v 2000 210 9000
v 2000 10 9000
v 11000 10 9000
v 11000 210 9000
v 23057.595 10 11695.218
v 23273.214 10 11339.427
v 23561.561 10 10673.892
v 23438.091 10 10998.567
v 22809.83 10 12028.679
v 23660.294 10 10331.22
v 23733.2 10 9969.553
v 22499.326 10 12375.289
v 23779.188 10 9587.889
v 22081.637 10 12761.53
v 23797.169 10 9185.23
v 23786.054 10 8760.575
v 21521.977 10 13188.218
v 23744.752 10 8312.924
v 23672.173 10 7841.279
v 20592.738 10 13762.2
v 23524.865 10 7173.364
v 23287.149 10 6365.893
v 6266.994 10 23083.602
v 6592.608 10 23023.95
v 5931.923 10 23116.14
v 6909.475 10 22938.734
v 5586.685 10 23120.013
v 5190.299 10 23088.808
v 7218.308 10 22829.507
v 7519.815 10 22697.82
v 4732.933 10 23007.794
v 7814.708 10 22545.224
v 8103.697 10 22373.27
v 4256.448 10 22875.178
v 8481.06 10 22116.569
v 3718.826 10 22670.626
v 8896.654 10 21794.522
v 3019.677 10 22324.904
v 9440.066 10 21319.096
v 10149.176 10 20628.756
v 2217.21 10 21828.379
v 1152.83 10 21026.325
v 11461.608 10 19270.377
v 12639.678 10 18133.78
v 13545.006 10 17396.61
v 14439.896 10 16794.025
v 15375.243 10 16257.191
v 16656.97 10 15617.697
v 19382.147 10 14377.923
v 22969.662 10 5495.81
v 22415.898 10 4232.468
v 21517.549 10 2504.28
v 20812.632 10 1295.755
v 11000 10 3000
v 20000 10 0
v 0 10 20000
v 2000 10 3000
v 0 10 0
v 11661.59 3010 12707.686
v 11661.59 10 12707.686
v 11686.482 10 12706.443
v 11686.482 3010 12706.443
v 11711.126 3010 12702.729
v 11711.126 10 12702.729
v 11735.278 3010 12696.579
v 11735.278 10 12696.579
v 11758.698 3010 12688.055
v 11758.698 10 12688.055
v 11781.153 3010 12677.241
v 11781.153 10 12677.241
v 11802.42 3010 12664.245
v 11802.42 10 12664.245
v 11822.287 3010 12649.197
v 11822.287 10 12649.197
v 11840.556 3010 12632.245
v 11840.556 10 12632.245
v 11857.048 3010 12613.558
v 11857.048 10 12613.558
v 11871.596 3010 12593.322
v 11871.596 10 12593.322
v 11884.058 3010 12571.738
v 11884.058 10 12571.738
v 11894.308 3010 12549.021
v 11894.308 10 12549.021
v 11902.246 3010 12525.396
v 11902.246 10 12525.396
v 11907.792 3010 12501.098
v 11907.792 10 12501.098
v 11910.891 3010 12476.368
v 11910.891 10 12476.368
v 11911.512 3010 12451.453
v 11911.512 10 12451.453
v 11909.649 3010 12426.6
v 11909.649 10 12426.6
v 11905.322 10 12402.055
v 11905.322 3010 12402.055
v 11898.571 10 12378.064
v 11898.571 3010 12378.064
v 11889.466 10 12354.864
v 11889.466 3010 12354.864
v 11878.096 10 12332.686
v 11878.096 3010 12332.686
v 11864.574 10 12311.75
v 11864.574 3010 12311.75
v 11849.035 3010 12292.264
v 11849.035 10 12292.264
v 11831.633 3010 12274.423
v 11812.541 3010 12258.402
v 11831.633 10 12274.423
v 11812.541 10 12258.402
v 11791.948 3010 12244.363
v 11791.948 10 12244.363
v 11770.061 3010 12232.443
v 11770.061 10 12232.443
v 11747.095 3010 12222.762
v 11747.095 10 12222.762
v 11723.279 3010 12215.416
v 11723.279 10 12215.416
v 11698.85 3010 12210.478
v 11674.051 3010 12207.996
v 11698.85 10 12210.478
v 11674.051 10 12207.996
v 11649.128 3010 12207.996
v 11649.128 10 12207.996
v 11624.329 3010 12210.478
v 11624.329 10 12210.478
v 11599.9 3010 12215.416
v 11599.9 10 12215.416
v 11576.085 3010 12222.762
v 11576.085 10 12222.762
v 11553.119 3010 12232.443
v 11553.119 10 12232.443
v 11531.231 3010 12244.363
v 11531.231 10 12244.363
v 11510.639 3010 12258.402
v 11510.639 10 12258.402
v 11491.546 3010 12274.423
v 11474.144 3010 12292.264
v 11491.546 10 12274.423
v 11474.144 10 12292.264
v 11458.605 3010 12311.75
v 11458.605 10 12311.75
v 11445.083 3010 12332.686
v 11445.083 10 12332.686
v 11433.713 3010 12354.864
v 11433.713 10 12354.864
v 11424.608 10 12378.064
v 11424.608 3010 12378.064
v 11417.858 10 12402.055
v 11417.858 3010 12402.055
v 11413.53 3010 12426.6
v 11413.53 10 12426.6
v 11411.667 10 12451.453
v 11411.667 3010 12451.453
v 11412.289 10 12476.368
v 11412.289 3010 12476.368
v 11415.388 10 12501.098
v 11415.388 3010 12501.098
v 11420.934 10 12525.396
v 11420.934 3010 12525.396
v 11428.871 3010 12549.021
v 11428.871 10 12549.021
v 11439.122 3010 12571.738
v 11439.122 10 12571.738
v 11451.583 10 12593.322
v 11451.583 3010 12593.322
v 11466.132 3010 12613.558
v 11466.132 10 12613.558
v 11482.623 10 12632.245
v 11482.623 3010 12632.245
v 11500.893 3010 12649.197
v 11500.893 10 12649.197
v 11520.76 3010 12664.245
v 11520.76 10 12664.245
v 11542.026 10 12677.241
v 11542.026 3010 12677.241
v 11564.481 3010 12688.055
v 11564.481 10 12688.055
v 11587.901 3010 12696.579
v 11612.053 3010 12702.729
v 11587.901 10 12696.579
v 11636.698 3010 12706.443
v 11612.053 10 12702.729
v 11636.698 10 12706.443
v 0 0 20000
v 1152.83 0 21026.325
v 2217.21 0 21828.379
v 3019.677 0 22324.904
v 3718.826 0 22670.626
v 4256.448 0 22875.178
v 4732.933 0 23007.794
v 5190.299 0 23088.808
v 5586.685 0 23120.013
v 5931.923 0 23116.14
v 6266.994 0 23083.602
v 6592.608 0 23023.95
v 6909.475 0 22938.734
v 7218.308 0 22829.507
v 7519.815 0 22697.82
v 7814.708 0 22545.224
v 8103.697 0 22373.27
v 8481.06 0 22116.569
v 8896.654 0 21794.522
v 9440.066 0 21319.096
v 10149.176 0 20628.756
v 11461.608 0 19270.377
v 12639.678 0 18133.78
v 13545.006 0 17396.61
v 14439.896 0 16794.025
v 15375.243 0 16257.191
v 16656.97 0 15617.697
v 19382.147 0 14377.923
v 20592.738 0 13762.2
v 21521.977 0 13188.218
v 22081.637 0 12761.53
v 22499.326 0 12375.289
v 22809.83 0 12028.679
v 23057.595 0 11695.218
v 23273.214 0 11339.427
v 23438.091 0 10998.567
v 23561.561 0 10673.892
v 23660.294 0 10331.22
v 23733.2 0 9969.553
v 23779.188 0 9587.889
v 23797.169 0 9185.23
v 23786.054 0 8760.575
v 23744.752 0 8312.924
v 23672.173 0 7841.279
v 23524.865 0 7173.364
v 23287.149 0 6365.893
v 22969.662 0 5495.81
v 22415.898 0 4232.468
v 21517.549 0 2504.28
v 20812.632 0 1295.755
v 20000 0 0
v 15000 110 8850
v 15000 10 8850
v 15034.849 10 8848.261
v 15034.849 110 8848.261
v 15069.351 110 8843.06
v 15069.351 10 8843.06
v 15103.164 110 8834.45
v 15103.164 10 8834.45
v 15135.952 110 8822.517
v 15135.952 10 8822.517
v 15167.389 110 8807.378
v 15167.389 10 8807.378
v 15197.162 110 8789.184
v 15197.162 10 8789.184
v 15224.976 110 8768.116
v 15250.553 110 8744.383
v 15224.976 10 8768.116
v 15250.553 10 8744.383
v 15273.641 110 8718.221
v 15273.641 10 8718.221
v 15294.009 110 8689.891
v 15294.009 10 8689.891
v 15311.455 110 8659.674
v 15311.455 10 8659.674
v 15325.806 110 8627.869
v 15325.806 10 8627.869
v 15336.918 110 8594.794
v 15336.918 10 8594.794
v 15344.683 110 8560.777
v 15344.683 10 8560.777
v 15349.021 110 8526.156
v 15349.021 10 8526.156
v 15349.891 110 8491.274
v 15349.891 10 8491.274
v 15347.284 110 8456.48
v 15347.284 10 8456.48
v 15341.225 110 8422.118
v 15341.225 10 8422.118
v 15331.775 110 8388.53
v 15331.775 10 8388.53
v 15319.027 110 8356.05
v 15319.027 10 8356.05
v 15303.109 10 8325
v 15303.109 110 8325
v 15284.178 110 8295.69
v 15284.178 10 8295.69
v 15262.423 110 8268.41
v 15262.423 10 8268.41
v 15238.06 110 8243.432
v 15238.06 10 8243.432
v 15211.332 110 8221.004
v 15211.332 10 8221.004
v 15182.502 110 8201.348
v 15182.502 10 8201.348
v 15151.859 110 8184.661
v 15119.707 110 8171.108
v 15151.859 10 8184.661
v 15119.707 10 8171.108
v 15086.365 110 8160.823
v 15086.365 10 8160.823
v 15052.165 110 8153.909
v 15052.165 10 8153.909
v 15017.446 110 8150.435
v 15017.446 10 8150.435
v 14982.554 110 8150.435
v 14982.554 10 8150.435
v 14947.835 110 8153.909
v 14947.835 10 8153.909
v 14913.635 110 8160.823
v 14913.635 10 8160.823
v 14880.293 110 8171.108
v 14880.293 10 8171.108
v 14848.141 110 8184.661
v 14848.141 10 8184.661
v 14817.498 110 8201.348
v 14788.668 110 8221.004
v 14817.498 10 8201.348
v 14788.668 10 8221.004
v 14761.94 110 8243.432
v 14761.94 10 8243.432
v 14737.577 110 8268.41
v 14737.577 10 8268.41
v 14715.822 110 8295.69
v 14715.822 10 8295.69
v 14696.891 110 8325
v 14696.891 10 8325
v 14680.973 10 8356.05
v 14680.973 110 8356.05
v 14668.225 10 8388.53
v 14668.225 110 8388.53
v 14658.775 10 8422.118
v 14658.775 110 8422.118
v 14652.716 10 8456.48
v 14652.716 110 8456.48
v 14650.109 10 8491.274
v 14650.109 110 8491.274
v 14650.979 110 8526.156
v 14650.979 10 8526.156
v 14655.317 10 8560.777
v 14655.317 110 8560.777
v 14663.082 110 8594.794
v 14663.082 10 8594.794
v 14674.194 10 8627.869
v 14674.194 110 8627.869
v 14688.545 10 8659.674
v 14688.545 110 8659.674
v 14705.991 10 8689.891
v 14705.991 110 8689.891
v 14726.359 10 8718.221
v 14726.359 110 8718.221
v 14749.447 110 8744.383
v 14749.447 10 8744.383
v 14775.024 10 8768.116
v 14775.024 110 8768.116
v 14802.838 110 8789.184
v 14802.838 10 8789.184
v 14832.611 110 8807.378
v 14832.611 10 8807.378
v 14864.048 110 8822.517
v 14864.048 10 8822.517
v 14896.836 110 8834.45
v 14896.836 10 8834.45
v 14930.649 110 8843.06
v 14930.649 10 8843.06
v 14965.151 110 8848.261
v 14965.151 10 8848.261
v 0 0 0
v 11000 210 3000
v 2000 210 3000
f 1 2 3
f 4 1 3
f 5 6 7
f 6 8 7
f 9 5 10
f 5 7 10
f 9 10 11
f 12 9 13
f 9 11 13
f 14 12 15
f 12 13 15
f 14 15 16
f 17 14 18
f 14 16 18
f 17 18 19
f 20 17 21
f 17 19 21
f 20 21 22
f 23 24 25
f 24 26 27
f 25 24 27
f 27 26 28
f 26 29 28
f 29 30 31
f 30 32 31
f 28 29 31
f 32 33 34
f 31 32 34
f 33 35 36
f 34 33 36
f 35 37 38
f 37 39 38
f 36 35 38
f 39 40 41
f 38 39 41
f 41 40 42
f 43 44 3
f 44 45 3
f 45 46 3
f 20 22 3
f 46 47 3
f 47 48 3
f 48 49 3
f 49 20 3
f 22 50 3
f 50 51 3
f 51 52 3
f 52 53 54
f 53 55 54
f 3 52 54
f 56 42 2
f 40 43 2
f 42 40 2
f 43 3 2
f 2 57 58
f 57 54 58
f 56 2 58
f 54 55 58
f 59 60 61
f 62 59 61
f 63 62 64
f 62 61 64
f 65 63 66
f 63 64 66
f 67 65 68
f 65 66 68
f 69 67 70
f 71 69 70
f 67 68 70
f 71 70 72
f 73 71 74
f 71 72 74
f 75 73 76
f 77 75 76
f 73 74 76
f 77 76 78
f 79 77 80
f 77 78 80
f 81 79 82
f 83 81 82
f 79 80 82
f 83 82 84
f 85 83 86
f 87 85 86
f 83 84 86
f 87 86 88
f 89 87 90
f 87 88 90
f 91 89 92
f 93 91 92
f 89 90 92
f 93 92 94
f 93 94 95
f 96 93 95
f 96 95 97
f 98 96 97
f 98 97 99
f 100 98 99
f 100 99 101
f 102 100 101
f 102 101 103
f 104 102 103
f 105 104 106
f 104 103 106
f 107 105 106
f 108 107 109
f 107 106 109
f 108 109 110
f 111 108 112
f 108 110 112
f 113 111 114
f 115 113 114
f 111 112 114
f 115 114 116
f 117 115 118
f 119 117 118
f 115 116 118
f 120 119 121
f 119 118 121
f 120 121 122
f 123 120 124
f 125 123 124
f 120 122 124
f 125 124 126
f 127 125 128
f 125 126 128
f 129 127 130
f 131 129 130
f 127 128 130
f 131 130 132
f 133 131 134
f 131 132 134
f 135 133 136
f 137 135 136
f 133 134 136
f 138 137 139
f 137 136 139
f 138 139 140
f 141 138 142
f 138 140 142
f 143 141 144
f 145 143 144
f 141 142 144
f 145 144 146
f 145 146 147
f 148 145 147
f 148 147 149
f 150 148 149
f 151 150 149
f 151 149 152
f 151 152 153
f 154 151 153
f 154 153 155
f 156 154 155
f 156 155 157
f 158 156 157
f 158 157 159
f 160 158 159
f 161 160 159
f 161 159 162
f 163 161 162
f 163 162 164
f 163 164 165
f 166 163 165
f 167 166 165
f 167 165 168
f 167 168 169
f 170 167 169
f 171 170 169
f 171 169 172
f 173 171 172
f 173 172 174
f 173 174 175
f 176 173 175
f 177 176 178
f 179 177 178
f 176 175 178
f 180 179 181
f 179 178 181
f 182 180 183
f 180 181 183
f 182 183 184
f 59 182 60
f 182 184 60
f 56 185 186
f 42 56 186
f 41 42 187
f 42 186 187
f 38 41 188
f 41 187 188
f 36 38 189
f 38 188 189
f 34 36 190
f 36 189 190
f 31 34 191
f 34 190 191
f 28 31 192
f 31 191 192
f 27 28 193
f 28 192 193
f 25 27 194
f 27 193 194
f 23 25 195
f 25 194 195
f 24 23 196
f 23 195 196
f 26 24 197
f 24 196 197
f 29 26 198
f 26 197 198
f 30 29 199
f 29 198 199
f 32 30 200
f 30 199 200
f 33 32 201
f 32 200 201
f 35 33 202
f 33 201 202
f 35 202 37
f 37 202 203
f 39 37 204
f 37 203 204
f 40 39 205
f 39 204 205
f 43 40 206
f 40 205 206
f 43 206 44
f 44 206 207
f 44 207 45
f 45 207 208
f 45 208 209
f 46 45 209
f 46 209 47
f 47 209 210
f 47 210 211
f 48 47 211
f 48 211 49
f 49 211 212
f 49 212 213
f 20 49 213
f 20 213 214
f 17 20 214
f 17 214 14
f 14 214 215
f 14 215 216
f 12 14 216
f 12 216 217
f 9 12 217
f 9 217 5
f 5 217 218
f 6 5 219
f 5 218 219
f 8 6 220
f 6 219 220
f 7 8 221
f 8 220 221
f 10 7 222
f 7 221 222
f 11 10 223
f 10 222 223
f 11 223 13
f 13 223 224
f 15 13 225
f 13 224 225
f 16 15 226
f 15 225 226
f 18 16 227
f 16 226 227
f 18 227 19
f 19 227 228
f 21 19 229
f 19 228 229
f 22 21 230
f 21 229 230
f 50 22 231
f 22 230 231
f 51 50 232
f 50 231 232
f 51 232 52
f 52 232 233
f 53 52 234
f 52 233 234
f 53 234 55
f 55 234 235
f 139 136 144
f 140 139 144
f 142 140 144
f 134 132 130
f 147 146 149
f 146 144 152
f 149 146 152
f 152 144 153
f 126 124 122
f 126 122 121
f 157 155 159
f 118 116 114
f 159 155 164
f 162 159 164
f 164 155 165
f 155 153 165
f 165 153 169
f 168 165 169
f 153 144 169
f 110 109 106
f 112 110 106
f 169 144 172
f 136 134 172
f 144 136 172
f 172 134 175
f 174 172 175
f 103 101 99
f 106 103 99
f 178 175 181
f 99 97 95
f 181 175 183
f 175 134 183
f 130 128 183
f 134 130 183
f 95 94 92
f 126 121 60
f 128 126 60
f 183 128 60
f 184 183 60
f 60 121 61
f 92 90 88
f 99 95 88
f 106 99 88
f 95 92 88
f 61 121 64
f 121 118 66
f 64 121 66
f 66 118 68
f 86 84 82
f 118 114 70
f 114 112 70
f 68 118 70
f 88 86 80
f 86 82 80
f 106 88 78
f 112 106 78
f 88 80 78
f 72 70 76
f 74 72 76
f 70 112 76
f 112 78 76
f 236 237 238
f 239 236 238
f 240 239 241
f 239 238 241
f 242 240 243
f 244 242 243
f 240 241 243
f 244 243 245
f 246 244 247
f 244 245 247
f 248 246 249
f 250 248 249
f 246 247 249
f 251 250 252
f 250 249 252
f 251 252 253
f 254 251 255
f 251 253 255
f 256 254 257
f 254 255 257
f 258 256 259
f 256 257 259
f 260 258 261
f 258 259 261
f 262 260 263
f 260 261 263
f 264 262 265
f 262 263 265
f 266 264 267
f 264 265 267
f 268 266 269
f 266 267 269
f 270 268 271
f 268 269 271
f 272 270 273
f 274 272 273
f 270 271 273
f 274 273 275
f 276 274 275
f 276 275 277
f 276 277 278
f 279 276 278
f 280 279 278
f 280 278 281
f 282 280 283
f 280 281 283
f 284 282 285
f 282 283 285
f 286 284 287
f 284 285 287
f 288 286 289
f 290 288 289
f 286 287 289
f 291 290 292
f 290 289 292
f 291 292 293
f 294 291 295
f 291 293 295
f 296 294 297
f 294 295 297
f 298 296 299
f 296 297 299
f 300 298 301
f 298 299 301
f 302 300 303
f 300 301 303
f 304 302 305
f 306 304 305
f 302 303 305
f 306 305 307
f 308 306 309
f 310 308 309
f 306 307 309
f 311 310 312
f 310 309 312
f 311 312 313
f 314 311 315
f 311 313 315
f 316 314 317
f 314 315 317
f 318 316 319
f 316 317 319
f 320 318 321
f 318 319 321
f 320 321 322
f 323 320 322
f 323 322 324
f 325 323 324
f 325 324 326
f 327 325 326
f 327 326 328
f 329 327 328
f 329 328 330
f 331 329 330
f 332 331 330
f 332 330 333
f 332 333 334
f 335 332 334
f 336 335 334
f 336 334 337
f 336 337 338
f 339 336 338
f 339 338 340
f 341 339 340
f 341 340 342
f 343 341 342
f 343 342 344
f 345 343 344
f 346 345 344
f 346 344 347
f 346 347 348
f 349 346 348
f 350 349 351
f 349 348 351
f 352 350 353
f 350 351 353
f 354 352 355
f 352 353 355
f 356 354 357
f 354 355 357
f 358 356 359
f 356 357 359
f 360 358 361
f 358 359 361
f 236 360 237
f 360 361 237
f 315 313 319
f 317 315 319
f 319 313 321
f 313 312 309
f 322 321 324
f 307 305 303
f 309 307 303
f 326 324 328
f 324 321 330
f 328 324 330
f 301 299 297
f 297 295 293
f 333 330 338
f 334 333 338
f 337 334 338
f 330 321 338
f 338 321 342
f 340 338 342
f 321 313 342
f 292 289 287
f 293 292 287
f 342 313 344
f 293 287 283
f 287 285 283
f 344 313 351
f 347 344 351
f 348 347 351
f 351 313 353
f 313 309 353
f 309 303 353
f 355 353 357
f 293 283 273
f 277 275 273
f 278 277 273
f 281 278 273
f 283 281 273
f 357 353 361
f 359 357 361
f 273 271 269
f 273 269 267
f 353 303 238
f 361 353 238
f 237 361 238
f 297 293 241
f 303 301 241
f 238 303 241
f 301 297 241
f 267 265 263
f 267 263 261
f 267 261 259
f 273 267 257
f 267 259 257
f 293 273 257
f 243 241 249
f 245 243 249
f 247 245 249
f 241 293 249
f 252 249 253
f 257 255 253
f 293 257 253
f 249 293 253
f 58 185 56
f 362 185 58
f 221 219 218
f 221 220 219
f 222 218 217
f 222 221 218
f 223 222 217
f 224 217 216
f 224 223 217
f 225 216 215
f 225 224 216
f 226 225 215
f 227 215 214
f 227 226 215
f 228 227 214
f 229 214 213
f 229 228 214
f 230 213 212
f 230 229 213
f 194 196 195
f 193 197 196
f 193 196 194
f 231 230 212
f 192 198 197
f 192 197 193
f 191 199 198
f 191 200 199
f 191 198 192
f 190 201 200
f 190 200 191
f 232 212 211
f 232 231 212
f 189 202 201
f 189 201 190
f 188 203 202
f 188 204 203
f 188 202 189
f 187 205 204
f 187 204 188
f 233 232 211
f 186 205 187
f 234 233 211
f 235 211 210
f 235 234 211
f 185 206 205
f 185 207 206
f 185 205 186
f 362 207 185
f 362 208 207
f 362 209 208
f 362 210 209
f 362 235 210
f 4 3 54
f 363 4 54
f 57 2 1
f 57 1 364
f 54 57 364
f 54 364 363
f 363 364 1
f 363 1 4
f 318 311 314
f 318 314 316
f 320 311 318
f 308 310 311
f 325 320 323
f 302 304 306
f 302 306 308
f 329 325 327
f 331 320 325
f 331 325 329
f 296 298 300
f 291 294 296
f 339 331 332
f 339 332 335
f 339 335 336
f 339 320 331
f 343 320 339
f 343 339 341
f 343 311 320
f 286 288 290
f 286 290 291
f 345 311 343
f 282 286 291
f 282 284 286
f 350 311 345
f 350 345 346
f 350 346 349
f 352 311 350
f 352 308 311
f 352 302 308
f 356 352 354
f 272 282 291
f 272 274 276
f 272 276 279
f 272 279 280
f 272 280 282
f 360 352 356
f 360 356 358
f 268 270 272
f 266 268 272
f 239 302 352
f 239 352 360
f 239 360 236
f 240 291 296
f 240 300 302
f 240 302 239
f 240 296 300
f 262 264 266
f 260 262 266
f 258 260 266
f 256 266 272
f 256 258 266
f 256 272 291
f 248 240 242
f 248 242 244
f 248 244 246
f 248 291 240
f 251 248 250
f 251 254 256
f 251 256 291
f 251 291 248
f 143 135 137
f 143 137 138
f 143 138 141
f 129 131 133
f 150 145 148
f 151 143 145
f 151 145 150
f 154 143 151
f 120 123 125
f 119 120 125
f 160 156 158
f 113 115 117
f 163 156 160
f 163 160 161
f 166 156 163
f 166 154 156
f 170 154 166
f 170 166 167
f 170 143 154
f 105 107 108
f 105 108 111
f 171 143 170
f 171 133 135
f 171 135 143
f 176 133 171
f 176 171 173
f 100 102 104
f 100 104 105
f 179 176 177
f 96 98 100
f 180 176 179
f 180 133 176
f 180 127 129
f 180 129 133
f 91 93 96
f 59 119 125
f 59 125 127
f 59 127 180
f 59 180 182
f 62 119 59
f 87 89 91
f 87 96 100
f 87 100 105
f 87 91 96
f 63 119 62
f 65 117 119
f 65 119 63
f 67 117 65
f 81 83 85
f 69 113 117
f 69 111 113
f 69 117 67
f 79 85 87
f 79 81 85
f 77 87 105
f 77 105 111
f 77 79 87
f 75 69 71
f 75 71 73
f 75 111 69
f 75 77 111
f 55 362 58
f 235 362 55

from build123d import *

# Parameters (mm, degrees)
EXTRUDE_1_DEPTH = 10
SKETCH_2_W      = 9000
SKETCH_2_H      = 6000
EXTRUDE_2_DEPTH = 200
SKETCH_3_R      = 350
EXTRUDE_3_DEPTH = 100
SKETCH_4_R      = 250
EXTRUDE_4_DEPTH = 3000


with BuildPart() as part:
    # Эскиз1 → Бобышка-Вытянуть1 (new body)
    with BuildSketch(Plane(origin=(0, 0, 0), x_dir=(1, 0, 0), z_dir=(0, 1, 0))):
        with BuildLine():
            Line((0, 0), (20000, 0))
            add(Edge.make_bspline(
                [(0, -20000), (7198.35283971, -26864.519570208), (12070.505785396, -12028.818977693), (29348.40206024, -14440.696342407), (20000, 0)],
                knots=[0, 0, 0, 0, 0.41355972, 1, 1, 1, 1], degree=3))
            Line((0, -20000), (0, 0))
        make_face()
    extrude(amount=EXTRUDE_1_DEPTH)

    # Эскиз2 → Бобышка-Вытянуть2 (add)
    with BuildSketch(Plane(origin=(0, 10, 0), x_dir=(1, 0, 0), z_dir=(0, 1, 0))):
        with Locations((6500, -6000)):
            Rectangle(SKETCH_2_W, SKETCH_2_H)
    extrude(amount=EXTRUDE_2_DEPTH)


with BuildPart() as body_2:
    # Эскиз3 → Бобышка-Вытянуть3 (new body)
    with BuildSketch(Plane(origin=(0, 10, 0), x_dir=(1, 0, 0), z_dir=(0, 1, 0))):
        with Locations(Location((15000, -8500, 0), (0, 0, 270))):
            Circle(SKETCH_3_R)
    extrude(amount=EXTRUDE_3_DEPTH)


with BuildPart() as body_3:
    # Эскиз4 → Бобышка-Вытянуть4 (new body)
    with BuildSketch(Plane(origin=(0, 10, 0), x_dir=(1, 0, 0), z_dir=(0, 1, 0))):
        with Locations(Location((11661.589659751, -12457.685557089, 0), (0, 0, 270))):
            Circle(SKETCH_4_R)
    extrude(amount=EXTRUDE_4_DEPTH)


solid = Compound([part.part, body_2.part, body_3.part])
